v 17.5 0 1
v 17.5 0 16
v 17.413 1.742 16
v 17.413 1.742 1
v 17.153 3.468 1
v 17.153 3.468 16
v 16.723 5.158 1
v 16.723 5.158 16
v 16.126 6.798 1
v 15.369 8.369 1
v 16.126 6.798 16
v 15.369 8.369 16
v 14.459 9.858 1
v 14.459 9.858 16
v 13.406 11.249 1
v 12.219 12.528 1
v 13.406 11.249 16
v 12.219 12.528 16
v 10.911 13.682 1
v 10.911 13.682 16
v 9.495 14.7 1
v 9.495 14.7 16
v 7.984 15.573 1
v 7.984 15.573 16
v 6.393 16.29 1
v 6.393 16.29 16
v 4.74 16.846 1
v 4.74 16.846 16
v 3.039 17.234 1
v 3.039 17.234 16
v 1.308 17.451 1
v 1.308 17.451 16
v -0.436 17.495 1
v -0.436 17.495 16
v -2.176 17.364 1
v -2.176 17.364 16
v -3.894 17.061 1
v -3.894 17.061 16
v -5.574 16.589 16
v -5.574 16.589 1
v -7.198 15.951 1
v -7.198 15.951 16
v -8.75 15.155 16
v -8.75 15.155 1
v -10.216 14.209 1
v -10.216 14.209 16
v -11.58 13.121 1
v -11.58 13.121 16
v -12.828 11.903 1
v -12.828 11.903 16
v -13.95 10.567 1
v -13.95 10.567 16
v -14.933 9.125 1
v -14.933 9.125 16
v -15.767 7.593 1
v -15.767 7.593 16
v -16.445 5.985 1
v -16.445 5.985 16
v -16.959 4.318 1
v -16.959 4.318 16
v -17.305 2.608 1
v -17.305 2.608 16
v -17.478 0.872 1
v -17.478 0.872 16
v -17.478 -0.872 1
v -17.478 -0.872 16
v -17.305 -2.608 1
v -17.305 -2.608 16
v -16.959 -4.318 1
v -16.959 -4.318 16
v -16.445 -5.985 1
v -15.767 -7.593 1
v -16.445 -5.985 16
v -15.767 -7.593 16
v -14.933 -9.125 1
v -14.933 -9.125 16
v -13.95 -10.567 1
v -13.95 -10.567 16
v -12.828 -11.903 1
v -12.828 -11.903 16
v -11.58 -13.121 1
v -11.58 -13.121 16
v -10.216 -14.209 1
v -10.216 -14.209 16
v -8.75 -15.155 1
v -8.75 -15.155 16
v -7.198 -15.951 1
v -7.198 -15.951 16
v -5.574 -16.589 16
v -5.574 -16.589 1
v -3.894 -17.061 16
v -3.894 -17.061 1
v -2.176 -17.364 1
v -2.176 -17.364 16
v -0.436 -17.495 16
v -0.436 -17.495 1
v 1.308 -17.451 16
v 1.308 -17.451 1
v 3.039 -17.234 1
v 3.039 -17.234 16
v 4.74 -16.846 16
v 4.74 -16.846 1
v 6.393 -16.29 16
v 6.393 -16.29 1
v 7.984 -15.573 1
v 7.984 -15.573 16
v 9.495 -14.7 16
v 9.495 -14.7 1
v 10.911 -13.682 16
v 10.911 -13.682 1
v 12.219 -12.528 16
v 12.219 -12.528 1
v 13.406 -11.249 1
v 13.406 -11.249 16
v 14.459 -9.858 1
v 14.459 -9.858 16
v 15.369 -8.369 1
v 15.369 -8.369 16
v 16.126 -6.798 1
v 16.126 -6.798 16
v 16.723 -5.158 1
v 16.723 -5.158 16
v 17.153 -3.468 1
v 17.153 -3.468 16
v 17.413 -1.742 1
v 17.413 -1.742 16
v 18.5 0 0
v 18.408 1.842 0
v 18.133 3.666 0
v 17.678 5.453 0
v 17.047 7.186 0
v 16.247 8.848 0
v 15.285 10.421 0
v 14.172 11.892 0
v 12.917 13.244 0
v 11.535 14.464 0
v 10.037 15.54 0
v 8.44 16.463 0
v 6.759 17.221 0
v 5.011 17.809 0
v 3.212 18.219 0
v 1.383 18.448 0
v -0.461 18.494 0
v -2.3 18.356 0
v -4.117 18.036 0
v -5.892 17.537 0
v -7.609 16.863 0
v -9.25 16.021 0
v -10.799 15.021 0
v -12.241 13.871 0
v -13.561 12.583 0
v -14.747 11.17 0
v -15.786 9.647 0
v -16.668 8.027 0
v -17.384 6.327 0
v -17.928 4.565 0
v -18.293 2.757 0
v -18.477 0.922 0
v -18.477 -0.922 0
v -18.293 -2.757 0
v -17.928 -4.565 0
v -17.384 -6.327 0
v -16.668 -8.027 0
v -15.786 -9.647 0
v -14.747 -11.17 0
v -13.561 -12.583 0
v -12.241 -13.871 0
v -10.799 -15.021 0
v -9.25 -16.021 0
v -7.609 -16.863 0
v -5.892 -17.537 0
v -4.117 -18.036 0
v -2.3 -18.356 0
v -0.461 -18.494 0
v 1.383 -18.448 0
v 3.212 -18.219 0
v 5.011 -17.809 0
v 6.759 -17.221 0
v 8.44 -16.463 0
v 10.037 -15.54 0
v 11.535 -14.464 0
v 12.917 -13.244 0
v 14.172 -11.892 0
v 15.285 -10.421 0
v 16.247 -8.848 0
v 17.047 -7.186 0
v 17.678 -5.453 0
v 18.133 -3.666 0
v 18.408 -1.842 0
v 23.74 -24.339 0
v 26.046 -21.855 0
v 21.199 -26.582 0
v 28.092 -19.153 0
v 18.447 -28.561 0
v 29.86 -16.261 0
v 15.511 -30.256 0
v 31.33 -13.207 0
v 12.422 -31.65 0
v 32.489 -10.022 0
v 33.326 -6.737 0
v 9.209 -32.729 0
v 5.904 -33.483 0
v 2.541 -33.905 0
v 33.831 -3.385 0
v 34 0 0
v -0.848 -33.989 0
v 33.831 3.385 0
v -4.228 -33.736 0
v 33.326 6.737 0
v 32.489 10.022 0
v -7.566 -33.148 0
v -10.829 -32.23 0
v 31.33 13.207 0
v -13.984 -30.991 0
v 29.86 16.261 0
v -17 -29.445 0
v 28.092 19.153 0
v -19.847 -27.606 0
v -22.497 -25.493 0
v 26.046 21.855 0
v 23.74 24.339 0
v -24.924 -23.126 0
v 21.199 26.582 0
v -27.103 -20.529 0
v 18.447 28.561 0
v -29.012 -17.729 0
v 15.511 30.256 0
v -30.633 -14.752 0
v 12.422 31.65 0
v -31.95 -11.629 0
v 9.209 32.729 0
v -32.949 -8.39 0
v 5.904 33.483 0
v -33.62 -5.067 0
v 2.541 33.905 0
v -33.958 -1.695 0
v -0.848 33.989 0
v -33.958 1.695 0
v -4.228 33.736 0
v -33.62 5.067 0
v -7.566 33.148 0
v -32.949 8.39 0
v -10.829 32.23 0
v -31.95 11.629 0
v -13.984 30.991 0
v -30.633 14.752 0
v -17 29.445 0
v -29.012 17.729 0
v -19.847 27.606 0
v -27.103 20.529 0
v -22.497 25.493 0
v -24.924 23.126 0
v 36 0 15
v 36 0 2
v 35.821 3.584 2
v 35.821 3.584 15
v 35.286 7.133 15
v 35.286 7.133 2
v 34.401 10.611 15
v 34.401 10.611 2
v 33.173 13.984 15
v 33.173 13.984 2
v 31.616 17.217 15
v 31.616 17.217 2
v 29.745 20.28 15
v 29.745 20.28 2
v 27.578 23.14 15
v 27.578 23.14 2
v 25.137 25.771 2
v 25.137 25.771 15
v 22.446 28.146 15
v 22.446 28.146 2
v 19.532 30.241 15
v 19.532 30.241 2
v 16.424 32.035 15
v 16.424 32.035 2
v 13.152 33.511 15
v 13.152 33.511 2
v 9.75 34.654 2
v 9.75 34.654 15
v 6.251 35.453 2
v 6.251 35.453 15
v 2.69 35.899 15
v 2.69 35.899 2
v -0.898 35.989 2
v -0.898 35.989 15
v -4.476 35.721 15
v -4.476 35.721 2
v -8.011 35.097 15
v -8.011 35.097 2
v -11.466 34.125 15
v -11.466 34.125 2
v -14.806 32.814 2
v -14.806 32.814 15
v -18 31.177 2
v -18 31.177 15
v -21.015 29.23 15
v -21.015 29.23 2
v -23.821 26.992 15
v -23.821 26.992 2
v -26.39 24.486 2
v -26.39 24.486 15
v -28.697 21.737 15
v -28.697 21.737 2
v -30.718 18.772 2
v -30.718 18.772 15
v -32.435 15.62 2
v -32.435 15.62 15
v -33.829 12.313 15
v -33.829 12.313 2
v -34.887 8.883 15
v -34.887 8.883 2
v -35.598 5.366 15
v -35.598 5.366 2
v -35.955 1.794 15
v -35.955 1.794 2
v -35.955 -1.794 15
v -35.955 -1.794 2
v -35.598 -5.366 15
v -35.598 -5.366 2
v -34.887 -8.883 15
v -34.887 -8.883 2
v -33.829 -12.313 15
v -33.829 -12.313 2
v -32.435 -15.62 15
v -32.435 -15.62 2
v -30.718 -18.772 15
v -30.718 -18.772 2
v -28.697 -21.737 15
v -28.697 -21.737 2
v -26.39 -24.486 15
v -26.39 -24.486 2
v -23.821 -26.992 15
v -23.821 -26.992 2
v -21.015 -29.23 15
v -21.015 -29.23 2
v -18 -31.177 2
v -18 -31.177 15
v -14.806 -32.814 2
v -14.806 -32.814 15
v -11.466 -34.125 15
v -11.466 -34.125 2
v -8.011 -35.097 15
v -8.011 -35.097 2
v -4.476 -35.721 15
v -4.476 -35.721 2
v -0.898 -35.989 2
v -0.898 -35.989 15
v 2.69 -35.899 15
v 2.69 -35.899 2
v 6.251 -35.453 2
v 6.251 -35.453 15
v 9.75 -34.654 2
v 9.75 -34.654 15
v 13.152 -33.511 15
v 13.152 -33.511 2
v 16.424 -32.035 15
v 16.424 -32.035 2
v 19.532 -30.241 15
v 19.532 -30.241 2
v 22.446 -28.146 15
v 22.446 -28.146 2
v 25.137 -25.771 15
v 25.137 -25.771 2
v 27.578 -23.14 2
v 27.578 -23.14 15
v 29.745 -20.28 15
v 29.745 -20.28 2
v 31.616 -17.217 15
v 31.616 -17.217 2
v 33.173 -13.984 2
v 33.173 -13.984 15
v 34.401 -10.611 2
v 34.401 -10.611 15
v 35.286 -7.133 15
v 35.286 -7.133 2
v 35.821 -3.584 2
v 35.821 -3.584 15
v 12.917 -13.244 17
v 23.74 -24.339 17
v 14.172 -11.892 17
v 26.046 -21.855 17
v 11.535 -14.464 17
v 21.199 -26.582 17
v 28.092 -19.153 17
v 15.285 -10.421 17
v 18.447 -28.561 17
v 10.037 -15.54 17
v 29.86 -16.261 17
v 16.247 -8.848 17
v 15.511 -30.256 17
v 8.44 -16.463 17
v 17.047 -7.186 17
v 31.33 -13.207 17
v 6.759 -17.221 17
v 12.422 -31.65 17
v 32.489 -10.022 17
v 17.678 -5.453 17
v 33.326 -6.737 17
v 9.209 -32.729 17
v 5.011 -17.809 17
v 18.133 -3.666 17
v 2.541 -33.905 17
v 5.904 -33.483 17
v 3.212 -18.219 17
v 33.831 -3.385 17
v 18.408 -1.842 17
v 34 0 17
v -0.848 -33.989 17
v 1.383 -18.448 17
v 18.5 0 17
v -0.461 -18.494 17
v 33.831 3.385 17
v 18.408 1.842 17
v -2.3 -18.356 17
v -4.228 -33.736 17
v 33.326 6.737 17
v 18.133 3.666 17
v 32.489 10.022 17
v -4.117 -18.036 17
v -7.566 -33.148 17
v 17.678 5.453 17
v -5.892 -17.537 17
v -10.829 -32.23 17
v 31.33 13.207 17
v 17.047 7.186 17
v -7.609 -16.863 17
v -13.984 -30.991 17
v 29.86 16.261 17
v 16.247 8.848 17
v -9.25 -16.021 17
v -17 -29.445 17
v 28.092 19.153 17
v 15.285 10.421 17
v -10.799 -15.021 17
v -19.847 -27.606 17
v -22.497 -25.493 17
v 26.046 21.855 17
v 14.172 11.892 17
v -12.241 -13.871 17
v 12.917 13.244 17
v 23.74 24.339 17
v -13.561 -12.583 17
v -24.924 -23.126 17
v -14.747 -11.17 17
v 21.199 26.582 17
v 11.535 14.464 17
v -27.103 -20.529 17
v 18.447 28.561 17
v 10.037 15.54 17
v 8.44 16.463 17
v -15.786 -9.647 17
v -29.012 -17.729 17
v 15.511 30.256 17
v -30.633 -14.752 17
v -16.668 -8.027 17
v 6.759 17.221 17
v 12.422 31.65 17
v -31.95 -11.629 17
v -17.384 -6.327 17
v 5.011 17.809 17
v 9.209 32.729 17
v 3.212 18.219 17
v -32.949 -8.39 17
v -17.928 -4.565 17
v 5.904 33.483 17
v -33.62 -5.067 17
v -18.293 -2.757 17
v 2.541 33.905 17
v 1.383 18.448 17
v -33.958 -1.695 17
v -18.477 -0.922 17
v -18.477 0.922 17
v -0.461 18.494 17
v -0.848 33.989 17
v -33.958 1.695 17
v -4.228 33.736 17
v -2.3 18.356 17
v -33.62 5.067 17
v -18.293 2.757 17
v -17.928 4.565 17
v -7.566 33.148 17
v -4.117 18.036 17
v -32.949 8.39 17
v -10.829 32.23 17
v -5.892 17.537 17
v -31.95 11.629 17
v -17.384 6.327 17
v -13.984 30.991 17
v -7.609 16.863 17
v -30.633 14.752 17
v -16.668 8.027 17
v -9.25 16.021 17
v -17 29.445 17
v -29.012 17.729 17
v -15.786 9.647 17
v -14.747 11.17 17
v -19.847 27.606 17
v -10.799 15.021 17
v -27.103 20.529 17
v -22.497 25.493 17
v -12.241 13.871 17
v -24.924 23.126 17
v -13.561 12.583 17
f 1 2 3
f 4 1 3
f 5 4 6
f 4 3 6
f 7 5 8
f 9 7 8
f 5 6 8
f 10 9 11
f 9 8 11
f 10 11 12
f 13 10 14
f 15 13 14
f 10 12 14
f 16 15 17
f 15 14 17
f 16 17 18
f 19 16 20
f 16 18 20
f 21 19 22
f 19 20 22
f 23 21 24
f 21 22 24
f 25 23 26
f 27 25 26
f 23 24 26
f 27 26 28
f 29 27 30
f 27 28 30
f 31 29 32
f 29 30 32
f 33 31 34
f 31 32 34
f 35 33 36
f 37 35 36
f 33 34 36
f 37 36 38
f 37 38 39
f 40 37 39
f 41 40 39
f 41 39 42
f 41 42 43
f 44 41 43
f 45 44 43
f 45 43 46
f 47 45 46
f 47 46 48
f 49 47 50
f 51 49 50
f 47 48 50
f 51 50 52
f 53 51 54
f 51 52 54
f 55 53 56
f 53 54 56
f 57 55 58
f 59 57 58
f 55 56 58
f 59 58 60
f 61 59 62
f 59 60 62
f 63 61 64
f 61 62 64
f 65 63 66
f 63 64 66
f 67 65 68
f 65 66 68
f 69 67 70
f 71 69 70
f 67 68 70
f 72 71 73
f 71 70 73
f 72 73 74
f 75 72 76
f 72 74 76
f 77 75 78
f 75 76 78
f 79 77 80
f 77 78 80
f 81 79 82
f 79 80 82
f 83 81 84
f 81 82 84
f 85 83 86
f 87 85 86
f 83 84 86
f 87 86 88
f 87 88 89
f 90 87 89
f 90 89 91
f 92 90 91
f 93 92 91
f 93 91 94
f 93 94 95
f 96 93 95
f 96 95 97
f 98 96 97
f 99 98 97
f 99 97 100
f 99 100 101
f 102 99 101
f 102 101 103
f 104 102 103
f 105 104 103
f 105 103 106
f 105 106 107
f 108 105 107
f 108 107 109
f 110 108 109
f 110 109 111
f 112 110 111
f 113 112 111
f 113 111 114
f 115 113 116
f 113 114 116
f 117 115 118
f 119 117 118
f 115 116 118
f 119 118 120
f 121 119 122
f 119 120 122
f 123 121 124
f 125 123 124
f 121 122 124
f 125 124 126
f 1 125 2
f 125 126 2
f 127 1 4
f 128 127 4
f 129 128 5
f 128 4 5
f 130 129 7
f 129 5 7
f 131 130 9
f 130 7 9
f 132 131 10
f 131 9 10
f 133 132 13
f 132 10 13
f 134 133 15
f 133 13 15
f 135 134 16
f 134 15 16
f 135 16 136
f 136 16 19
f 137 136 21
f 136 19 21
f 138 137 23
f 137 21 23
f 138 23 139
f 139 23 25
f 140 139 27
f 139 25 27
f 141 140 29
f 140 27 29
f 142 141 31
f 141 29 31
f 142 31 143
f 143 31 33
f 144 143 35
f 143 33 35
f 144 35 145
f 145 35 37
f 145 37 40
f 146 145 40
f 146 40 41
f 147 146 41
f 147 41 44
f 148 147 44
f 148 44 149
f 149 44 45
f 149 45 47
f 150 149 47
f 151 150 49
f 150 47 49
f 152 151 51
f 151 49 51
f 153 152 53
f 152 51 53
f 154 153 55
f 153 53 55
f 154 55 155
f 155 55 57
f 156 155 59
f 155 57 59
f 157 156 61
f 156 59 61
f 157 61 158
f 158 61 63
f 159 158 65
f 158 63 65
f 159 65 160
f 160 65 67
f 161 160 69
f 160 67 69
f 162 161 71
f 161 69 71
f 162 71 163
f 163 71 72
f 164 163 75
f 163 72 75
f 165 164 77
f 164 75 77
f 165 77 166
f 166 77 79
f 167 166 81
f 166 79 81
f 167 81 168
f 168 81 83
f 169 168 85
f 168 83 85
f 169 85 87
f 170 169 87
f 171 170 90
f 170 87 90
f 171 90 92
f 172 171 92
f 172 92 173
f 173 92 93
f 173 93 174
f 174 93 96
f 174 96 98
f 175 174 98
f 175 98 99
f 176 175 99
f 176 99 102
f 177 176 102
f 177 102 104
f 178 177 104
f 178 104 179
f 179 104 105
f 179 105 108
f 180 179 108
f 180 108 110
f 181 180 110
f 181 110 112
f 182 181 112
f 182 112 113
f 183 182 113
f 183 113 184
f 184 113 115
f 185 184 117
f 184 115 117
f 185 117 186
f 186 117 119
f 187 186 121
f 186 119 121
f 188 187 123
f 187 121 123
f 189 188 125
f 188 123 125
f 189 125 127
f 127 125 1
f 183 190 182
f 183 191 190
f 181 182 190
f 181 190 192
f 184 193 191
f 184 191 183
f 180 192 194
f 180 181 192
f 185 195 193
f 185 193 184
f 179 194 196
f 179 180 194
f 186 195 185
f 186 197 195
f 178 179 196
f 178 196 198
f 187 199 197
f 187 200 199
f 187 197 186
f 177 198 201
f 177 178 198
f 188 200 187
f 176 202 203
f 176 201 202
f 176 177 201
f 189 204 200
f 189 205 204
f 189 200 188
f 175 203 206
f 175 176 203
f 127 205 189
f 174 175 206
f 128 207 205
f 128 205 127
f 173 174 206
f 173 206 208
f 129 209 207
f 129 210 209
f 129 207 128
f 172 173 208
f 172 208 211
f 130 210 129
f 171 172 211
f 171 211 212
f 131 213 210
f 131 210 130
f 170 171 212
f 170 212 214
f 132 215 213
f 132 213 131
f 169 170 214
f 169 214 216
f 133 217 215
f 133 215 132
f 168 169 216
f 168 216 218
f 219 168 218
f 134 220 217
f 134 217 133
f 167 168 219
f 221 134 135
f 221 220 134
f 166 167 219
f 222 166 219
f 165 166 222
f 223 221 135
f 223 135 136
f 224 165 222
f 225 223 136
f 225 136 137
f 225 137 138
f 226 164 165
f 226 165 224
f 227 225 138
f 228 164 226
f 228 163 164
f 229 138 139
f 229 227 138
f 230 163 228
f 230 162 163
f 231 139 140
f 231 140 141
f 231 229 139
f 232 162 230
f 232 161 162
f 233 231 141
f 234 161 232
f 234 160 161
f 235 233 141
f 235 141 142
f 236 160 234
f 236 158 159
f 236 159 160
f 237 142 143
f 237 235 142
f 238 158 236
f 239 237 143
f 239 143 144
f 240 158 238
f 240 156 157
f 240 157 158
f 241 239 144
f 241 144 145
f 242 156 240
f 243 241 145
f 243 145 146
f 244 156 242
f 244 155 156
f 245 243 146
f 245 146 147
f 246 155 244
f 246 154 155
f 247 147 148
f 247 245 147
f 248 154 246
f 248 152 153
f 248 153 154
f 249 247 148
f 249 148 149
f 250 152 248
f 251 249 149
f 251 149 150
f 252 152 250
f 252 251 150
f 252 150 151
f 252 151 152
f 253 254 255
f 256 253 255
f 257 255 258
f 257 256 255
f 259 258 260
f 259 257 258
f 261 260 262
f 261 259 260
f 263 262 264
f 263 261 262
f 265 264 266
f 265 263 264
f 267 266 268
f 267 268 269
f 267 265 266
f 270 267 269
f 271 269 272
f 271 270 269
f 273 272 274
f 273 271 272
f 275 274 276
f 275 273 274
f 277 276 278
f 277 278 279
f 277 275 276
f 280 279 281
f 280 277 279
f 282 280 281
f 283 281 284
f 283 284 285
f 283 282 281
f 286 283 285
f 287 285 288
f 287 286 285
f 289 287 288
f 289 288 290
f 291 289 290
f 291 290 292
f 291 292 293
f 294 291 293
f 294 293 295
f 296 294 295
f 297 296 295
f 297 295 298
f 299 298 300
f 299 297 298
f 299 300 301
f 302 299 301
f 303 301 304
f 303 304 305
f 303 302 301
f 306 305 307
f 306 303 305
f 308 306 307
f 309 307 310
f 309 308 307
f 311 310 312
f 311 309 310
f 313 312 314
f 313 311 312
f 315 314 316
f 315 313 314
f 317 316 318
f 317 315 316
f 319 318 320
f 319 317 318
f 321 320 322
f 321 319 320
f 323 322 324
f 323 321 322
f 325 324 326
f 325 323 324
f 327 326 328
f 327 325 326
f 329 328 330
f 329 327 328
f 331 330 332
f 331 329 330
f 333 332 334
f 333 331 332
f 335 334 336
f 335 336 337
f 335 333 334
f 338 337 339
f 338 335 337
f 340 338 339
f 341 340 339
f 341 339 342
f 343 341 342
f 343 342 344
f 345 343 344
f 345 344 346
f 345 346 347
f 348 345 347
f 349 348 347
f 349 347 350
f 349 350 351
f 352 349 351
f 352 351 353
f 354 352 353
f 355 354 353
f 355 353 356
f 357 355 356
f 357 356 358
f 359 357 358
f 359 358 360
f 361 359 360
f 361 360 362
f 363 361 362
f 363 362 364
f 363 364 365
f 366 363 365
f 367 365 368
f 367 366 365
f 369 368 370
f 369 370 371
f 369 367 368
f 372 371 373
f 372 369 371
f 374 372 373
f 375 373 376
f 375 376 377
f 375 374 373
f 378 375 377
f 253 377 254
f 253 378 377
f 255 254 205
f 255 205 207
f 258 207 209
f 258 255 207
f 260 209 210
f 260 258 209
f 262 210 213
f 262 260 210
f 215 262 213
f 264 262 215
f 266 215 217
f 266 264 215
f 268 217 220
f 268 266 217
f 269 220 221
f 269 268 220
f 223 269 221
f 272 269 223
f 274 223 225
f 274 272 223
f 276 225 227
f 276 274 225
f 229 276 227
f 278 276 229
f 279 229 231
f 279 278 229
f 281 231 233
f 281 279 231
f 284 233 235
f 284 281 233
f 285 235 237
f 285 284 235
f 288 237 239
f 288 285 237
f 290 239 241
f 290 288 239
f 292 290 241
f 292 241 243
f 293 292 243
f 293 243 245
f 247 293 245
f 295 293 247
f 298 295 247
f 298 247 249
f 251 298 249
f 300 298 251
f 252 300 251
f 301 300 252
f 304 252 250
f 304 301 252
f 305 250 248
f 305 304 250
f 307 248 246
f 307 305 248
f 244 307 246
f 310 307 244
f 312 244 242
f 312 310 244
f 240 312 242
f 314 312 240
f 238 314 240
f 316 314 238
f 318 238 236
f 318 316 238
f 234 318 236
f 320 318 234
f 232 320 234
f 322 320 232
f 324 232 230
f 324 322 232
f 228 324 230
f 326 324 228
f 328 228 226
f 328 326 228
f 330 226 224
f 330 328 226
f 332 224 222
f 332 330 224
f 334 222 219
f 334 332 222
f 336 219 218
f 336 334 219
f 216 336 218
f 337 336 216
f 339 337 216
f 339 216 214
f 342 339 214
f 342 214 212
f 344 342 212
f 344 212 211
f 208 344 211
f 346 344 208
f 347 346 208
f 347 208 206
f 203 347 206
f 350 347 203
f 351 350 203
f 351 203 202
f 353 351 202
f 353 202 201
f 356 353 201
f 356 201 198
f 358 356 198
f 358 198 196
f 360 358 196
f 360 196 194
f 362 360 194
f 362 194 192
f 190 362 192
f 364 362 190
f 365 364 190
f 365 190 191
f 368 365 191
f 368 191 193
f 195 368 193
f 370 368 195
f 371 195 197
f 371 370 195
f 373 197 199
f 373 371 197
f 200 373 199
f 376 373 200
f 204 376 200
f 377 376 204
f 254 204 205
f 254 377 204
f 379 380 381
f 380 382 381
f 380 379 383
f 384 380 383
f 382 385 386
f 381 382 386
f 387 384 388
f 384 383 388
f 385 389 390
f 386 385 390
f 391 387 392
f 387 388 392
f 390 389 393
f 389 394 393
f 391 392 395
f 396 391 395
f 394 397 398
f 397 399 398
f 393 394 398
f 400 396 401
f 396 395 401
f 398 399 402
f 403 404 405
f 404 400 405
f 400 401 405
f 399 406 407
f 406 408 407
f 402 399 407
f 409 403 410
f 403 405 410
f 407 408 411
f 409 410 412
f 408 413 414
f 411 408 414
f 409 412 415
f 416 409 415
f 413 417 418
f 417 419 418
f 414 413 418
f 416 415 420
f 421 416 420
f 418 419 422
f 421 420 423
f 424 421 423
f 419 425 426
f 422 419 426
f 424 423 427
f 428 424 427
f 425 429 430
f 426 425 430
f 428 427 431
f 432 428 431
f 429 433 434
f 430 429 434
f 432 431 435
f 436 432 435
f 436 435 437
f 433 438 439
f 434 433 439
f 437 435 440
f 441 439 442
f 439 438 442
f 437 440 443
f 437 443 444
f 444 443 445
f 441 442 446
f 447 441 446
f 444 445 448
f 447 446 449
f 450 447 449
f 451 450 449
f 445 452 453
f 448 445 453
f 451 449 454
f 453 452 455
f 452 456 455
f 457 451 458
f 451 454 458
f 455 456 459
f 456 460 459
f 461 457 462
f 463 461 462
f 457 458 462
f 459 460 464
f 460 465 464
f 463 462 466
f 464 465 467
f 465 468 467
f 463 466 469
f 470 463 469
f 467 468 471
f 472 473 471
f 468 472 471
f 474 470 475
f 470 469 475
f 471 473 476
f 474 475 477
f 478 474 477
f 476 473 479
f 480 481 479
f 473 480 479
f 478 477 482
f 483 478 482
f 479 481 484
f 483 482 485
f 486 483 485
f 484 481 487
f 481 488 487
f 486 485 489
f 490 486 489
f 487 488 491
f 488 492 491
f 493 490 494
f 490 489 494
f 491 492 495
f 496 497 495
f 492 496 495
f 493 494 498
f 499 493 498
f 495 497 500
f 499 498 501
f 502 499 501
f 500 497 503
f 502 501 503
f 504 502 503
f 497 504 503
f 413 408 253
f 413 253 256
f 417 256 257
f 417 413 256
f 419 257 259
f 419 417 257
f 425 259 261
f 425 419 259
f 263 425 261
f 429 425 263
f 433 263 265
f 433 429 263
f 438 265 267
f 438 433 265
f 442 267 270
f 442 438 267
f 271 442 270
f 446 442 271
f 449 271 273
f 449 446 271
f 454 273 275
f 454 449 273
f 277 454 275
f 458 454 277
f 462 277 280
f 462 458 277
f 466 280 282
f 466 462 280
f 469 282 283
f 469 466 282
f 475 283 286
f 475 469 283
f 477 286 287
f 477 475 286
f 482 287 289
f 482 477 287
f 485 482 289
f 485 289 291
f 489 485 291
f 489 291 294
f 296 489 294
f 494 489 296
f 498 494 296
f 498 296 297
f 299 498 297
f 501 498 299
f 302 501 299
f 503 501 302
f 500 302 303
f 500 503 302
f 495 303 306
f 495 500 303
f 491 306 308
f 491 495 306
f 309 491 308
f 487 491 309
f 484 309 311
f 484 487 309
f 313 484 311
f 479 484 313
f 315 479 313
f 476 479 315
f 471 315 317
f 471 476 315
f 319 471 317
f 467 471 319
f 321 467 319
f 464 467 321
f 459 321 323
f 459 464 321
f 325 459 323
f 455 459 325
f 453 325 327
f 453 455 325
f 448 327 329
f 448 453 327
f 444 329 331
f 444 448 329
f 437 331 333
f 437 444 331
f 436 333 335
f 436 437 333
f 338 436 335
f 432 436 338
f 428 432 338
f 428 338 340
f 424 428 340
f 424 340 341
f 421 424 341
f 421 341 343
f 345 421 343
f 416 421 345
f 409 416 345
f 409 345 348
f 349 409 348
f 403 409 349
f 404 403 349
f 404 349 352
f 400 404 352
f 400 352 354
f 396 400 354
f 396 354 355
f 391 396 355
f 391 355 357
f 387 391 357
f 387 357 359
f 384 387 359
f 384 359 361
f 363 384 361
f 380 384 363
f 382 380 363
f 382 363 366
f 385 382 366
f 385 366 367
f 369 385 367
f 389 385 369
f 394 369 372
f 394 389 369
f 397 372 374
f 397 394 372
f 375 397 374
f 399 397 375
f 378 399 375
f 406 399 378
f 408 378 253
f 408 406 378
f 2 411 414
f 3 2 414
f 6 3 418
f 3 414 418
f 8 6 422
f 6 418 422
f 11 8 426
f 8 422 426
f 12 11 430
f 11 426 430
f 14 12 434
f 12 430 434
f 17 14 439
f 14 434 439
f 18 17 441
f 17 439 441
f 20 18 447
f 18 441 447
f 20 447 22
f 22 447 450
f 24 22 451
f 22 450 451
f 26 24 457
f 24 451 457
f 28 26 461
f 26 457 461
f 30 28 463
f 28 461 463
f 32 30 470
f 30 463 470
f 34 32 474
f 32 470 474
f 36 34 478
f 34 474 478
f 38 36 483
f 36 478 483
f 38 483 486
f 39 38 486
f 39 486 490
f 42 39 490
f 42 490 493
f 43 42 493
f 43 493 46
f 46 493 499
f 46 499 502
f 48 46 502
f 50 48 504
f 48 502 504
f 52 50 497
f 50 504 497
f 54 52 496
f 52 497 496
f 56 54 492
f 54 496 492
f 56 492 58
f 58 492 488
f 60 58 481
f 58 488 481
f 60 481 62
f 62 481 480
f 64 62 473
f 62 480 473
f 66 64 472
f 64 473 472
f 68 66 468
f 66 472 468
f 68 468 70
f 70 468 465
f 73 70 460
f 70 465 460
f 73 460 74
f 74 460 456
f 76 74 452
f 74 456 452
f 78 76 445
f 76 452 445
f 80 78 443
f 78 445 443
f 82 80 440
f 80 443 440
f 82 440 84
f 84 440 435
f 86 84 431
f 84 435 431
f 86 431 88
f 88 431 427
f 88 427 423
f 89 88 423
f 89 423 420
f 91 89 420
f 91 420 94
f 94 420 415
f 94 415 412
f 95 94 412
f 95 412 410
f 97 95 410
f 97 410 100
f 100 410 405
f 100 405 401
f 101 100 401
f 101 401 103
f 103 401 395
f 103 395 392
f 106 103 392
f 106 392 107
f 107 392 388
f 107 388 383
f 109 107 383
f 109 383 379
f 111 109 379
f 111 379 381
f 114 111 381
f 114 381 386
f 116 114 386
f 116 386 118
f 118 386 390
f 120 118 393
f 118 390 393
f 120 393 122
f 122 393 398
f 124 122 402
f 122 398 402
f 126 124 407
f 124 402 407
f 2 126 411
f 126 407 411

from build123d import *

# Parameters (mm, degrees)
F0_W    = 18.5
F0_H    = 17
F2_SIZE = 2
F3_SIZE = 1


with BuildPart() as f1:
    # F0 (on Front) → F1 (revolve)
    with BuildSketch(Plane.XZ):
        with Locations((26.75, 8.5)):
            Rectangle(F0_W, F0_H)
    revolve(axis=Axis((0, 0, 7.291329), (0, 0, 1)))

    # F2
    f2_edges = [f1.edges().sort_by_distance(p)[0] for p in [
        (-36, 0, 17),
        (-36, 0, 0),
        (36, 0, 8.5),
    ]]
    chamfer(f2_edges, length=F2_SIZE)

    # F3
    f3_edges = [f1.edges().sort_by_distance(p)[0] for p in [
        (-17.5, 0, 17),
        (-17.5, 0, 0),
    ]]
    chamfer(f3_edges, length=F3_SIZE)


solid = f1.part
